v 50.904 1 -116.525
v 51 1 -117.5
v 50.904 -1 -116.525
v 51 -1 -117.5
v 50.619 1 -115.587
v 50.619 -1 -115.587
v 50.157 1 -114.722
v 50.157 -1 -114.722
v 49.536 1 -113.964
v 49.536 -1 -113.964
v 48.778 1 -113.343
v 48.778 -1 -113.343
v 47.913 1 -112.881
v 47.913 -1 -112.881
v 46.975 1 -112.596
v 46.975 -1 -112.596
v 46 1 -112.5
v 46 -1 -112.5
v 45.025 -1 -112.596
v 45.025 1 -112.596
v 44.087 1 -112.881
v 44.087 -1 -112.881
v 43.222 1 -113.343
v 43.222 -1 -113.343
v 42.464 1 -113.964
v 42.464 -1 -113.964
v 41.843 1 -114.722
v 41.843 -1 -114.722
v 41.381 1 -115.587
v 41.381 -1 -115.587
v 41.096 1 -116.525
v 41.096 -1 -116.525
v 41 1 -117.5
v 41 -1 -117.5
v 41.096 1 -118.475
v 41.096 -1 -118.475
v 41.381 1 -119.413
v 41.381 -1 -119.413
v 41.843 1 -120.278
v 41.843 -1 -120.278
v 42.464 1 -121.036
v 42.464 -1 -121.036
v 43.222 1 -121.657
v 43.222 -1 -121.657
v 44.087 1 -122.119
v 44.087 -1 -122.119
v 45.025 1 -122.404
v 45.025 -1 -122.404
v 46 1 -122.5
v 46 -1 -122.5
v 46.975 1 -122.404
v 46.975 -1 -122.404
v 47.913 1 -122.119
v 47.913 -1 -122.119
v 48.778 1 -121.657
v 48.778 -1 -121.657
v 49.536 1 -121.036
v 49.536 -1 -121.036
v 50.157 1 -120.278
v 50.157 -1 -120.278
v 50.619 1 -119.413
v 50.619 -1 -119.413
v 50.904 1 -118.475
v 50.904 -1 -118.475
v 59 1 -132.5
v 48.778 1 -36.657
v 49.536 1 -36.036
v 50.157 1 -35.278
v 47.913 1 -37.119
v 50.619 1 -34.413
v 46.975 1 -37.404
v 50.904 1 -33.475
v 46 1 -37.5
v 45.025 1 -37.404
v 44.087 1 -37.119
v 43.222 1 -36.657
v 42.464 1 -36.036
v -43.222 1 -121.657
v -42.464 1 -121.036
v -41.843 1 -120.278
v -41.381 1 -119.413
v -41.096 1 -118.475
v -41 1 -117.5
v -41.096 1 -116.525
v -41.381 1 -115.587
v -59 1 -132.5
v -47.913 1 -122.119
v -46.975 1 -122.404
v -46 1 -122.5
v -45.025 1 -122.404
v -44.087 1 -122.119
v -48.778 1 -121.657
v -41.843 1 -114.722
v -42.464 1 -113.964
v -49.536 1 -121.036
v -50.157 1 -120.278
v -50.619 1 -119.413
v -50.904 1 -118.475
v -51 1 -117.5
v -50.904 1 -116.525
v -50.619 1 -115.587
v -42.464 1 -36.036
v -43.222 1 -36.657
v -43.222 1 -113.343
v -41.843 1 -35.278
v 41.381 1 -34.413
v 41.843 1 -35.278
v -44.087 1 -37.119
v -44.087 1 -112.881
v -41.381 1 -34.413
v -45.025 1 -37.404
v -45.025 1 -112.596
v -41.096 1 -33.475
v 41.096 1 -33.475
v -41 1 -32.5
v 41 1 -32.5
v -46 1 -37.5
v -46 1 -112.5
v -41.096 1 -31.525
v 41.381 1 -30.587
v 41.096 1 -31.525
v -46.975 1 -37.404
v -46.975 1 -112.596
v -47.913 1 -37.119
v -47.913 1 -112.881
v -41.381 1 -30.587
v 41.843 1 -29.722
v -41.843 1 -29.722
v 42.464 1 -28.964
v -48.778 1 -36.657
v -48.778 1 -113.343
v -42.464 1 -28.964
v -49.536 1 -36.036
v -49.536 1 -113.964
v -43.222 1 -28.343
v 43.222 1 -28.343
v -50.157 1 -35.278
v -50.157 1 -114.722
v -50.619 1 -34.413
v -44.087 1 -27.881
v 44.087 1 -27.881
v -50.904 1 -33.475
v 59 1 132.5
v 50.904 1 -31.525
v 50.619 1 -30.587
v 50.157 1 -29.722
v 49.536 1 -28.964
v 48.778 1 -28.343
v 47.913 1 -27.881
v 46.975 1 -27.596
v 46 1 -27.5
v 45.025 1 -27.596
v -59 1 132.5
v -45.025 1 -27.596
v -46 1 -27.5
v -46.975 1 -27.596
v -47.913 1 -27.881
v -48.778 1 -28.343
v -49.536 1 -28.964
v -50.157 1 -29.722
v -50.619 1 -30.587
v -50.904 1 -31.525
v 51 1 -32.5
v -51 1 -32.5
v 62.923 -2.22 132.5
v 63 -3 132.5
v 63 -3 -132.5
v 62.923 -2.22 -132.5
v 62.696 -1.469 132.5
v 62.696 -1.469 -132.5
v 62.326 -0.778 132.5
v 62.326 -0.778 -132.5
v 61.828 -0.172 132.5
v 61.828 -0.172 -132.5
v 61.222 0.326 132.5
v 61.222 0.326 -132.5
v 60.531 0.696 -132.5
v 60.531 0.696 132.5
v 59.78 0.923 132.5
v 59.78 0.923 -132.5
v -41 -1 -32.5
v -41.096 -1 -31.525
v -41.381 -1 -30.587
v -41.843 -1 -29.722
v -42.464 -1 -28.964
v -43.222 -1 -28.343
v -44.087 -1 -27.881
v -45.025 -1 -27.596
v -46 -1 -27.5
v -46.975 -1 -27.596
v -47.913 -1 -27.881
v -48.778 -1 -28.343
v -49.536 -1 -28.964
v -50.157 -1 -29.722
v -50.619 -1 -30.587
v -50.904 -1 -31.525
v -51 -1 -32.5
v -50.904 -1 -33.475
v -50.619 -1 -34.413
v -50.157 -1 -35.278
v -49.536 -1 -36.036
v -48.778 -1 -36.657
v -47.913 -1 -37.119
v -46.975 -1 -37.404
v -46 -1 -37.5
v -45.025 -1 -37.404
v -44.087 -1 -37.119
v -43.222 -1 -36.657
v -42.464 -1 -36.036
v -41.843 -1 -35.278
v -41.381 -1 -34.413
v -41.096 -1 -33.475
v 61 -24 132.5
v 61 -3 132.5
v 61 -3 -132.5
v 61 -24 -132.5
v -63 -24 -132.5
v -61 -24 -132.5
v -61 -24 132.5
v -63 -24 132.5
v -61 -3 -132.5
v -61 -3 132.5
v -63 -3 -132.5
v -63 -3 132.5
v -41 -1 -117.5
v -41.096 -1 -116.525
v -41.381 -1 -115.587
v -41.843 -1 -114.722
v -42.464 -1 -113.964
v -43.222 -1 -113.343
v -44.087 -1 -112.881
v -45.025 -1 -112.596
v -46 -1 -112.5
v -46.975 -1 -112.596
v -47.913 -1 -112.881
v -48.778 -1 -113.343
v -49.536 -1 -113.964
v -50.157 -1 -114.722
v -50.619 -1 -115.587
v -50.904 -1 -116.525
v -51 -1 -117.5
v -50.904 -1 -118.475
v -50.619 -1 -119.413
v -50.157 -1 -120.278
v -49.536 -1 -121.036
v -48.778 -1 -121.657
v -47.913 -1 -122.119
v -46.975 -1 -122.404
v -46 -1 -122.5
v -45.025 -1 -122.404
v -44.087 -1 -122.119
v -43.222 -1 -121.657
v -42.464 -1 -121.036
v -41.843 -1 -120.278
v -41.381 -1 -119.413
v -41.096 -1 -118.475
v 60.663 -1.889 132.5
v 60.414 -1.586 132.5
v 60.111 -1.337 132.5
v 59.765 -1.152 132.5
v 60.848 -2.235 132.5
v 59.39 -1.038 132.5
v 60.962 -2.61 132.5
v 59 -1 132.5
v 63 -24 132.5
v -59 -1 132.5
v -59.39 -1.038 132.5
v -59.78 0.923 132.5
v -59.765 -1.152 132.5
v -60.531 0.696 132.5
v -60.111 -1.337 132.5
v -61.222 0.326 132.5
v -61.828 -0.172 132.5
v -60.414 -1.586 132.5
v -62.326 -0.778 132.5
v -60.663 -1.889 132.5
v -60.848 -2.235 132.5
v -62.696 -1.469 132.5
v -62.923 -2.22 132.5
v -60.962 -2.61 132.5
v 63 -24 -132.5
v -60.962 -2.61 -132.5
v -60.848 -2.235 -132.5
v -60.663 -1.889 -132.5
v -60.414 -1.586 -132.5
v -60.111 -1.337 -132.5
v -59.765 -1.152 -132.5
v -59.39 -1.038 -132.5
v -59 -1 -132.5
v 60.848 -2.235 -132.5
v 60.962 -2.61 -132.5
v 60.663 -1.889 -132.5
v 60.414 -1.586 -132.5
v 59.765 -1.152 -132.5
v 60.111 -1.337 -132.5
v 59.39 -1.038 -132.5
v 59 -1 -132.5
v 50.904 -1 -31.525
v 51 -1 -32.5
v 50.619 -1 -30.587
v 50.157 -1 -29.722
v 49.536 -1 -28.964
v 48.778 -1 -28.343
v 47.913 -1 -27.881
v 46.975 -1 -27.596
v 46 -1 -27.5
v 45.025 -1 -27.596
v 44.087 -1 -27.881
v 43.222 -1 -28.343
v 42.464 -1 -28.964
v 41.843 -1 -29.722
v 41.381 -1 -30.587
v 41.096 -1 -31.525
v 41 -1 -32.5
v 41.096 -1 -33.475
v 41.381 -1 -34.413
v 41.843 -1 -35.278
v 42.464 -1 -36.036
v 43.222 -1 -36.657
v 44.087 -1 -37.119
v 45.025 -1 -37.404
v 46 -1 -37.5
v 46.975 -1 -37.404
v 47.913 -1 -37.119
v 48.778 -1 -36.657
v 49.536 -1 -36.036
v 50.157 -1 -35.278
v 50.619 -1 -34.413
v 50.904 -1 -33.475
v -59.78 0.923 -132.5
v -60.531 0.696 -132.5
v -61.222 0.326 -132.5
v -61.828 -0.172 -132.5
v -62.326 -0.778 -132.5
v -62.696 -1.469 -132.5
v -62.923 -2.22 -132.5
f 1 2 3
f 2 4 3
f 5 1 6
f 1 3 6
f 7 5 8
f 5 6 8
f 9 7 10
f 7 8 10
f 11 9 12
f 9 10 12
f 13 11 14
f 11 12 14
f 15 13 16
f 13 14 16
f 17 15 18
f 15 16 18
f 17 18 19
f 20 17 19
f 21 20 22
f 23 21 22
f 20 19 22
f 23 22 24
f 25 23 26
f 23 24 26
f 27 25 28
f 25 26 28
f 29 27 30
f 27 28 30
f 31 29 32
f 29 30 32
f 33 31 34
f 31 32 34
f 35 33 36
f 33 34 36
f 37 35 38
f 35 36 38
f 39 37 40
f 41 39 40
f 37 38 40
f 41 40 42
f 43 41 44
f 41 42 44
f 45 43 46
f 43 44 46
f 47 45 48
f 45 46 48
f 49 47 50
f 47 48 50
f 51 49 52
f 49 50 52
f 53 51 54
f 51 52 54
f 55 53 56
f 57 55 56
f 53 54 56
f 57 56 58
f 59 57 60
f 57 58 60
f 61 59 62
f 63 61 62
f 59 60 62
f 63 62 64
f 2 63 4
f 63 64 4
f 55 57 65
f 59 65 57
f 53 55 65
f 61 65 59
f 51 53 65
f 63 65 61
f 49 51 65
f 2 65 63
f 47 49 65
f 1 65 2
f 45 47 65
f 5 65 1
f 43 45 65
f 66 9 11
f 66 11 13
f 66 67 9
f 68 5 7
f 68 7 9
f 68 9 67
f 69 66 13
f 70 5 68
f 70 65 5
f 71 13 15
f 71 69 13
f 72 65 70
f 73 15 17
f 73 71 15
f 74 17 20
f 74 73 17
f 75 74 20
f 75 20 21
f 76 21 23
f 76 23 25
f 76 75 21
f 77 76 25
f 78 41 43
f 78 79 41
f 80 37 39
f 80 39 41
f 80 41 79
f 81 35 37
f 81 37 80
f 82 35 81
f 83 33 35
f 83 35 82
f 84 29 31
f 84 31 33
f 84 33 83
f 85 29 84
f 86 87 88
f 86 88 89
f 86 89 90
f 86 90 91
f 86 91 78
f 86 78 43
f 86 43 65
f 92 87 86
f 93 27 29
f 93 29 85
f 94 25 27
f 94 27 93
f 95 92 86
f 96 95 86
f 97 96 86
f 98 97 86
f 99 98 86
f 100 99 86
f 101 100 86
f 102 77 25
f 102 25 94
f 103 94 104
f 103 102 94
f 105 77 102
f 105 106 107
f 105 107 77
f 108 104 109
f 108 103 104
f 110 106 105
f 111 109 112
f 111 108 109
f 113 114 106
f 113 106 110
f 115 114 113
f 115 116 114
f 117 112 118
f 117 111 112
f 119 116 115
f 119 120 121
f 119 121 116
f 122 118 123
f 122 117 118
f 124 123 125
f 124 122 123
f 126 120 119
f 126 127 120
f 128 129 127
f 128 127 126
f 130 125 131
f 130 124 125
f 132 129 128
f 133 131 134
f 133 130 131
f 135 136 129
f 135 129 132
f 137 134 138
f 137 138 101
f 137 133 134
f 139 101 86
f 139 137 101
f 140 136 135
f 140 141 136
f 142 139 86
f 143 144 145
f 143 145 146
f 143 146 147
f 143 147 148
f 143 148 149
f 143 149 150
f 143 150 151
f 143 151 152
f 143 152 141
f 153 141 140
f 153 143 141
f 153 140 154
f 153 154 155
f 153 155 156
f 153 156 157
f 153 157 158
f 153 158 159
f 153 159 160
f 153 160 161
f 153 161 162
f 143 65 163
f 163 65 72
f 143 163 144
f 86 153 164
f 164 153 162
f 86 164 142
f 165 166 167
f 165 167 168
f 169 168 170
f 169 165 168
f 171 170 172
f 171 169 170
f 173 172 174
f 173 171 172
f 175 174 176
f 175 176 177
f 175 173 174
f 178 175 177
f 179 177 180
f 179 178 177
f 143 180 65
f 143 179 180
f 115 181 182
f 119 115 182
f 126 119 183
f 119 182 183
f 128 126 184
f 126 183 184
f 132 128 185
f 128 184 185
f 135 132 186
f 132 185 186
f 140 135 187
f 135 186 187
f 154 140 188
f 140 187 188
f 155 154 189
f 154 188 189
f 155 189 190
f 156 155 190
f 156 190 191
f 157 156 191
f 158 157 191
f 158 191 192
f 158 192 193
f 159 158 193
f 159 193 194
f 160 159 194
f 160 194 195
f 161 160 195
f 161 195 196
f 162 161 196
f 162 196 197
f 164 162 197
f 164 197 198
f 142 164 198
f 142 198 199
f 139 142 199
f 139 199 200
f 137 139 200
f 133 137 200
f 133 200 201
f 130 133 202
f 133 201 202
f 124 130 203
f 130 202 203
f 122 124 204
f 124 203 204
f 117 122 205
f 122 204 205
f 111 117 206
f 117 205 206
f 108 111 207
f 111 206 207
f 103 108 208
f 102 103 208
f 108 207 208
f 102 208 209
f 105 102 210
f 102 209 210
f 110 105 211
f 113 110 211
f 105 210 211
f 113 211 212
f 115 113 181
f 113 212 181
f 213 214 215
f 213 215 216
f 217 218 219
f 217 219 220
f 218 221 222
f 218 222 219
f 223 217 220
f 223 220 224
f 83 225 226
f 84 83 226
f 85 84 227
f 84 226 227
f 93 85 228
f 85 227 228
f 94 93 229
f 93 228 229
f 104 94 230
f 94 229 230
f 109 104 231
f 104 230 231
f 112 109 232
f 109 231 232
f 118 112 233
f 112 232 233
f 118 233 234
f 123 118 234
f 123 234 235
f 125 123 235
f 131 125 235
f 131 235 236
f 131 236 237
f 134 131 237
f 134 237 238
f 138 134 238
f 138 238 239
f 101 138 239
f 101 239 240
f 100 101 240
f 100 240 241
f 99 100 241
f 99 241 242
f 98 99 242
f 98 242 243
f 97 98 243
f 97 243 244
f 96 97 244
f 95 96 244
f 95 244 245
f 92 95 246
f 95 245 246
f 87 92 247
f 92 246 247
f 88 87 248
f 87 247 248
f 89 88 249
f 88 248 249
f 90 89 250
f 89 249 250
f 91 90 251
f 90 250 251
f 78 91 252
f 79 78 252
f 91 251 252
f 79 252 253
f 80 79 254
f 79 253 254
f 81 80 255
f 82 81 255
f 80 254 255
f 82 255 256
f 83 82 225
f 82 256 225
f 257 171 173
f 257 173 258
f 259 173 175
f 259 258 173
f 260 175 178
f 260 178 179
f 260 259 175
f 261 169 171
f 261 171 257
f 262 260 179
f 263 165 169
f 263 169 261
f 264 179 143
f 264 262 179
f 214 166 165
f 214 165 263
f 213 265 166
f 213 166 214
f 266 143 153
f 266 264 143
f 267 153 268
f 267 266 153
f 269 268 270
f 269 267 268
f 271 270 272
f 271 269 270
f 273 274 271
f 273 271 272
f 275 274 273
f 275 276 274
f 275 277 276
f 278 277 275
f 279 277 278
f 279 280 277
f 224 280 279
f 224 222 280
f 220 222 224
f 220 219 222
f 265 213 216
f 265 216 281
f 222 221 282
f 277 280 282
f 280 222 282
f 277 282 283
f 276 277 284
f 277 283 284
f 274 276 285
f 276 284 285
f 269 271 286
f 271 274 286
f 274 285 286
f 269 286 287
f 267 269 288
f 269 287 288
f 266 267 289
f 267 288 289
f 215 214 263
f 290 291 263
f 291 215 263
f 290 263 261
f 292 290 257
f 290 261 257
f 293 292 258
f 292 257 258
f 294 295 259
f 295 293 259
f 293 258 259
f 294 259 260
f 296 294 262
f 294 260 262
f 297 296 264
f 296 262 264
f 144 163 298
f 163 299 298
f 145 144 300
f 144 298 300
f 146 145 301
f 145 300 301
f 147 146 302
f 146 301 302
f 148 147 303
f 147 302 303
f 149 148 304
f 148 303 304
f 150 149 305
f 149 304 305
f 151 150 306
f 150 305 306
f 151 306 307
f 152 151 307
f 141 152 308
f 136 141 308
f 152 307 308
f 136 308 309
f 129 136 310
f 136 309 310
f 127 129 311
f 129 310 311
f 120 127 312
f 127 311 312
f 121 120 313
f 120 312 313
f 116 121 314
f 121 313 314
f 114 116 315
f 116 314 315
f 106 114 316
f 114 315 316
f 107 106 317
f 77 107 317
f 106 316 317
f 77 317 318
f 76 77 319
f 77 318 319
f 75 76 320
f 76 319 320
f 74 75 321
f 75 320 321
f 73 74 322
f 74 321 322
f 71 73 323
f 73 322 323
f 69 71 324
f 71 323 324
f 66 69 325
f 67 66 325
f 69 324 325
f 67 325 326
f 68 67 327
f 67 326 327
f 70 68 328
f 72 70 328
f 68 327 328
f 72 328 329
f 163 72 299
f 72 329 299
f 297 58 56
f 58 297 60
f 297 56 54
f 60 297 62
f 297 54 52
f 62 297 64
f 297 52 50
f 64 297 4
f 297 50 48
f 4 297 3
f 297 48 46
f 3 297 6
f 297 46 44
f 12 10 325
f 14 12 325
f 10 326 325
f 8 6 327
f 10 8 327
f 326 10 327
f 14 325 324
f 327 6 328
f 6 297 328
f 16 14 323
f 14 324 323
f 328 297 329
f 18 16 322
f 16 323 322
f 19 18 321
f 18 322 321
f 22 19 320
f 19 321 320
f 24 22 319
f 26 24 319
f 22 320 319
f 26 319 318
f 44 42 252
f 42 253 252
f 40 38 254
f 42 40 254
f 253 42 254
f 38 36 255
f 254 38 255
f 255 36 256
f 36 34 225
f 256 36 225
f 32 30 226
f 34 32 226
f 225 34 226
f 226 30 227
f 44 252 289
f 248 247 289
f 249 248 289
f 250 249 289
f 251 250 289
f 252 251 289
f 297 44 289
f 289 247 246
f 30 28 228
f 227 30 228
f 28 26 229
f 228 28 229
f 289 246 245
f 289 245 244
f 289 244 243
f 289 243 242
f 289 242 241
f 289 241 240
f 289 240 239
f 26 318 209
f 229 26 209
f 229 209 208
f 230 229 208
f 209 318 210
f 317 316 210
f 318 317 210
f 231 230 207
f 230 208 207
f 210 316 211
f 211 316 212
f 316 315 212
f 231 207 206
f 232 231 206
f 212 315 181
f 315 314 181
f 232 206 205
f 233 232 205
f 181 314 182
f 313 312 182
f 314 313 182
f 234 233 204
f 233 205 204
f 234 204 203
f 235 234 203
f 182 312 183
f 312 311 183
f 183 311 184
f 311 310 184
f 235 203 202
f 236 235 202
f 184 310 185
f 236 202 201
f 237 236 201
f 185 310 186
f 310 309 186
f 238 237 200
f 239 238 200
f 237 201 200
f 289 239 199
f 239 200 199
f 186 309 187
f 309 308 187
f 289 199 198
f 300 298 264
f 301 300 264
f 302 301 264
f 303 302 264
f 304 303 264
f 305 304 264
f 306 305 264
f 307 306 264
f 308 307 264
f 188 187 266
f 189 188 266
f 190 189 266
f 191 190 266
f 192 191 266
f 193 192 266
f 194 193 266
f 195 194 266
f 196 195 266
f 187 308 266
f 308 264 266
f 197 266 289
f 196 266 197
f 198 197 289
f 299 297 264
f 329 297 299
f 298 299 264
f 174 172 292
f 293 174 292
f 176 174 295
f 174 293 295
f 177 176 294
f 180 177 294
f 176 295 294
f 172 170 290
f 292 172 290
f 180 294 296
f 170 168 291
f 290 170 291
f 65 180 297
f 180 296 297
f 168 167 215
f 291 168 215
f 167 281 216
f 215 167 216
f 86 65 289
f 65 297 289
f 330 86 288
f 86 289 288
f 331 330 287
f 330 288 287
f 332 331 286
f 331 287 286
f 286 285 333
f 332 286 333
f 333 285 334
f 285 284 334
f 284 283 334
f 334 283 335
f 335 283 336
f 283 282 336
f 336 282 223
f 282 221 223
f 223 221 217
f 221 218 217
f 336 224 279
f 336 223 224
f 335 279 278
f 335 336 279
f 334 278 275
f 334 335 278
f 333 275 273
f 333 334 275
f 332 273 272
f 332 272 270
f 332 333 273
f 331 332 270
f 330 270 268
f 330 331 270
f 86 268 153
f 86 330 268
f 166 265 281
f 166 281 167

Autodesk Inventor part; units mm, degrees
ref_plane "YZ Plane" through (0, 0, 0) normal (1, 0, 0) x (0, 1, 0)
ref_plane "XZ Plane" through (0, 0, 0) normal (0, 1, 0) x (-1, 0, 0)
ref_plane "XY Plane" through (0, 0, 0) normal (0, 0, 1) x (1, 0, 0)
sketch "Sketch4" plane through (0, 0, 0) normal (0, 1, 0) x (-1, 0, 0)
  line L0 (63, -132.5) -> (-63, -132.5)
  line L1 (-63, -132.5) -> (-63, 132.5)
  line L2 (-63, 132.5) -> (63, 132.5)
  line L3 (63, 132.5) -> (63, -132.5)
  line L4 (63, -132.5) -> (-63, 132.5) construction
  point P0 (0, 0)
  point P1 (0, 0)
  dimension "d24" = 126
  dimension "d25" = 265
extrude "Plate4" add sketch "Sketch4" along normal mid plane 2
sketch "Sketch7" plane through (0, -1, 0) normal (0, -1, 0) x (1, 0, 0)
  circle A0 centre (46, -117.5) radius 5
  line L0 (63, 132.5) -> (63, -132.5) projected
  line L1 (63, -132.5) -> (-63, -132.5) projected
  line L2 (0, -74.3103) -> (0, 74.3103) construction
  line L3 (114.9724, 0) -> (-114.9724, 0) construction
  circle A1 centre (-46, -117.5) radius 5
  circle A2 centre (46, -32.5) radius 5
  circle A3 centre (-46, -32.5) radius 5
  point P0 (0, 0)
  point P1 (0, 0)
  dimension "d41" = 10
  dimension "d42" = 17
  dimension "d43" = 15
  dimension "d46" = 85
extrude "Extrusion2" cut sketch "Sketch7" against normal up to surface (2 mm away)
sketch "Sketch8" plane through (61, 1, 132.5) normal (1, 0, 0) x (0, 1, 0)
  line L0 (0, -265) -> (0, 0)
  line L1 (0, 0) -> (-25, 0)
  line L2 (-25, 0) -> (-25, -265)
  line L3 (-25, -265) -> (0, -265)
edge flange "Flange4" height 25 angle 90 thickness 2 bend radius 2 thickness toward (1, 0, 0) relief tear relief width 2 relief depth 1 corner gap 2 corner form 0 edges at (63, -1, 0) (-63, -1, 0) wall of the first edge with corners at (61, 1, -132.5) (61, 1, 132.5) (61, -24, 132.5) (61, -24, -132.5)
bend "Bend4"
corner "Corner4"
equation "\"d26\" = Thickness"
equation "\"d47\" = BendReliefWidth"
equation "\"d48\" = BendReliefDepth"
equation "\"d49\" = MinimumRemnant"
equation "\"d50\" = TransitionRadius"
equation "\"d53\" = BendRadius"
equation "\"d54\" = CornerReliefSize"
equation "\"d55\" = GapSize"
equation "\"d56\" = JacobiRadiusSize"
equation "\"BendRadius\" = Thickness"
equation "\"BendReliefWidth\" = Thickness"
equation "\"BendReliefDepth\" = 0.5 * Thickness"
equation "\"CornerReliefSize\" = 4 * Thickness"
equation "\"MinimumRemnant\" = 2 * Thickness"
equation "\"TransitionRadius\" = BendRadius"
equation "\"JacobiRadiusSize\" = BendRadius"
equation "\"GapSize\" = Thickness"
equation "\"Thickness\" = 2"
properties part number "Крепление"
